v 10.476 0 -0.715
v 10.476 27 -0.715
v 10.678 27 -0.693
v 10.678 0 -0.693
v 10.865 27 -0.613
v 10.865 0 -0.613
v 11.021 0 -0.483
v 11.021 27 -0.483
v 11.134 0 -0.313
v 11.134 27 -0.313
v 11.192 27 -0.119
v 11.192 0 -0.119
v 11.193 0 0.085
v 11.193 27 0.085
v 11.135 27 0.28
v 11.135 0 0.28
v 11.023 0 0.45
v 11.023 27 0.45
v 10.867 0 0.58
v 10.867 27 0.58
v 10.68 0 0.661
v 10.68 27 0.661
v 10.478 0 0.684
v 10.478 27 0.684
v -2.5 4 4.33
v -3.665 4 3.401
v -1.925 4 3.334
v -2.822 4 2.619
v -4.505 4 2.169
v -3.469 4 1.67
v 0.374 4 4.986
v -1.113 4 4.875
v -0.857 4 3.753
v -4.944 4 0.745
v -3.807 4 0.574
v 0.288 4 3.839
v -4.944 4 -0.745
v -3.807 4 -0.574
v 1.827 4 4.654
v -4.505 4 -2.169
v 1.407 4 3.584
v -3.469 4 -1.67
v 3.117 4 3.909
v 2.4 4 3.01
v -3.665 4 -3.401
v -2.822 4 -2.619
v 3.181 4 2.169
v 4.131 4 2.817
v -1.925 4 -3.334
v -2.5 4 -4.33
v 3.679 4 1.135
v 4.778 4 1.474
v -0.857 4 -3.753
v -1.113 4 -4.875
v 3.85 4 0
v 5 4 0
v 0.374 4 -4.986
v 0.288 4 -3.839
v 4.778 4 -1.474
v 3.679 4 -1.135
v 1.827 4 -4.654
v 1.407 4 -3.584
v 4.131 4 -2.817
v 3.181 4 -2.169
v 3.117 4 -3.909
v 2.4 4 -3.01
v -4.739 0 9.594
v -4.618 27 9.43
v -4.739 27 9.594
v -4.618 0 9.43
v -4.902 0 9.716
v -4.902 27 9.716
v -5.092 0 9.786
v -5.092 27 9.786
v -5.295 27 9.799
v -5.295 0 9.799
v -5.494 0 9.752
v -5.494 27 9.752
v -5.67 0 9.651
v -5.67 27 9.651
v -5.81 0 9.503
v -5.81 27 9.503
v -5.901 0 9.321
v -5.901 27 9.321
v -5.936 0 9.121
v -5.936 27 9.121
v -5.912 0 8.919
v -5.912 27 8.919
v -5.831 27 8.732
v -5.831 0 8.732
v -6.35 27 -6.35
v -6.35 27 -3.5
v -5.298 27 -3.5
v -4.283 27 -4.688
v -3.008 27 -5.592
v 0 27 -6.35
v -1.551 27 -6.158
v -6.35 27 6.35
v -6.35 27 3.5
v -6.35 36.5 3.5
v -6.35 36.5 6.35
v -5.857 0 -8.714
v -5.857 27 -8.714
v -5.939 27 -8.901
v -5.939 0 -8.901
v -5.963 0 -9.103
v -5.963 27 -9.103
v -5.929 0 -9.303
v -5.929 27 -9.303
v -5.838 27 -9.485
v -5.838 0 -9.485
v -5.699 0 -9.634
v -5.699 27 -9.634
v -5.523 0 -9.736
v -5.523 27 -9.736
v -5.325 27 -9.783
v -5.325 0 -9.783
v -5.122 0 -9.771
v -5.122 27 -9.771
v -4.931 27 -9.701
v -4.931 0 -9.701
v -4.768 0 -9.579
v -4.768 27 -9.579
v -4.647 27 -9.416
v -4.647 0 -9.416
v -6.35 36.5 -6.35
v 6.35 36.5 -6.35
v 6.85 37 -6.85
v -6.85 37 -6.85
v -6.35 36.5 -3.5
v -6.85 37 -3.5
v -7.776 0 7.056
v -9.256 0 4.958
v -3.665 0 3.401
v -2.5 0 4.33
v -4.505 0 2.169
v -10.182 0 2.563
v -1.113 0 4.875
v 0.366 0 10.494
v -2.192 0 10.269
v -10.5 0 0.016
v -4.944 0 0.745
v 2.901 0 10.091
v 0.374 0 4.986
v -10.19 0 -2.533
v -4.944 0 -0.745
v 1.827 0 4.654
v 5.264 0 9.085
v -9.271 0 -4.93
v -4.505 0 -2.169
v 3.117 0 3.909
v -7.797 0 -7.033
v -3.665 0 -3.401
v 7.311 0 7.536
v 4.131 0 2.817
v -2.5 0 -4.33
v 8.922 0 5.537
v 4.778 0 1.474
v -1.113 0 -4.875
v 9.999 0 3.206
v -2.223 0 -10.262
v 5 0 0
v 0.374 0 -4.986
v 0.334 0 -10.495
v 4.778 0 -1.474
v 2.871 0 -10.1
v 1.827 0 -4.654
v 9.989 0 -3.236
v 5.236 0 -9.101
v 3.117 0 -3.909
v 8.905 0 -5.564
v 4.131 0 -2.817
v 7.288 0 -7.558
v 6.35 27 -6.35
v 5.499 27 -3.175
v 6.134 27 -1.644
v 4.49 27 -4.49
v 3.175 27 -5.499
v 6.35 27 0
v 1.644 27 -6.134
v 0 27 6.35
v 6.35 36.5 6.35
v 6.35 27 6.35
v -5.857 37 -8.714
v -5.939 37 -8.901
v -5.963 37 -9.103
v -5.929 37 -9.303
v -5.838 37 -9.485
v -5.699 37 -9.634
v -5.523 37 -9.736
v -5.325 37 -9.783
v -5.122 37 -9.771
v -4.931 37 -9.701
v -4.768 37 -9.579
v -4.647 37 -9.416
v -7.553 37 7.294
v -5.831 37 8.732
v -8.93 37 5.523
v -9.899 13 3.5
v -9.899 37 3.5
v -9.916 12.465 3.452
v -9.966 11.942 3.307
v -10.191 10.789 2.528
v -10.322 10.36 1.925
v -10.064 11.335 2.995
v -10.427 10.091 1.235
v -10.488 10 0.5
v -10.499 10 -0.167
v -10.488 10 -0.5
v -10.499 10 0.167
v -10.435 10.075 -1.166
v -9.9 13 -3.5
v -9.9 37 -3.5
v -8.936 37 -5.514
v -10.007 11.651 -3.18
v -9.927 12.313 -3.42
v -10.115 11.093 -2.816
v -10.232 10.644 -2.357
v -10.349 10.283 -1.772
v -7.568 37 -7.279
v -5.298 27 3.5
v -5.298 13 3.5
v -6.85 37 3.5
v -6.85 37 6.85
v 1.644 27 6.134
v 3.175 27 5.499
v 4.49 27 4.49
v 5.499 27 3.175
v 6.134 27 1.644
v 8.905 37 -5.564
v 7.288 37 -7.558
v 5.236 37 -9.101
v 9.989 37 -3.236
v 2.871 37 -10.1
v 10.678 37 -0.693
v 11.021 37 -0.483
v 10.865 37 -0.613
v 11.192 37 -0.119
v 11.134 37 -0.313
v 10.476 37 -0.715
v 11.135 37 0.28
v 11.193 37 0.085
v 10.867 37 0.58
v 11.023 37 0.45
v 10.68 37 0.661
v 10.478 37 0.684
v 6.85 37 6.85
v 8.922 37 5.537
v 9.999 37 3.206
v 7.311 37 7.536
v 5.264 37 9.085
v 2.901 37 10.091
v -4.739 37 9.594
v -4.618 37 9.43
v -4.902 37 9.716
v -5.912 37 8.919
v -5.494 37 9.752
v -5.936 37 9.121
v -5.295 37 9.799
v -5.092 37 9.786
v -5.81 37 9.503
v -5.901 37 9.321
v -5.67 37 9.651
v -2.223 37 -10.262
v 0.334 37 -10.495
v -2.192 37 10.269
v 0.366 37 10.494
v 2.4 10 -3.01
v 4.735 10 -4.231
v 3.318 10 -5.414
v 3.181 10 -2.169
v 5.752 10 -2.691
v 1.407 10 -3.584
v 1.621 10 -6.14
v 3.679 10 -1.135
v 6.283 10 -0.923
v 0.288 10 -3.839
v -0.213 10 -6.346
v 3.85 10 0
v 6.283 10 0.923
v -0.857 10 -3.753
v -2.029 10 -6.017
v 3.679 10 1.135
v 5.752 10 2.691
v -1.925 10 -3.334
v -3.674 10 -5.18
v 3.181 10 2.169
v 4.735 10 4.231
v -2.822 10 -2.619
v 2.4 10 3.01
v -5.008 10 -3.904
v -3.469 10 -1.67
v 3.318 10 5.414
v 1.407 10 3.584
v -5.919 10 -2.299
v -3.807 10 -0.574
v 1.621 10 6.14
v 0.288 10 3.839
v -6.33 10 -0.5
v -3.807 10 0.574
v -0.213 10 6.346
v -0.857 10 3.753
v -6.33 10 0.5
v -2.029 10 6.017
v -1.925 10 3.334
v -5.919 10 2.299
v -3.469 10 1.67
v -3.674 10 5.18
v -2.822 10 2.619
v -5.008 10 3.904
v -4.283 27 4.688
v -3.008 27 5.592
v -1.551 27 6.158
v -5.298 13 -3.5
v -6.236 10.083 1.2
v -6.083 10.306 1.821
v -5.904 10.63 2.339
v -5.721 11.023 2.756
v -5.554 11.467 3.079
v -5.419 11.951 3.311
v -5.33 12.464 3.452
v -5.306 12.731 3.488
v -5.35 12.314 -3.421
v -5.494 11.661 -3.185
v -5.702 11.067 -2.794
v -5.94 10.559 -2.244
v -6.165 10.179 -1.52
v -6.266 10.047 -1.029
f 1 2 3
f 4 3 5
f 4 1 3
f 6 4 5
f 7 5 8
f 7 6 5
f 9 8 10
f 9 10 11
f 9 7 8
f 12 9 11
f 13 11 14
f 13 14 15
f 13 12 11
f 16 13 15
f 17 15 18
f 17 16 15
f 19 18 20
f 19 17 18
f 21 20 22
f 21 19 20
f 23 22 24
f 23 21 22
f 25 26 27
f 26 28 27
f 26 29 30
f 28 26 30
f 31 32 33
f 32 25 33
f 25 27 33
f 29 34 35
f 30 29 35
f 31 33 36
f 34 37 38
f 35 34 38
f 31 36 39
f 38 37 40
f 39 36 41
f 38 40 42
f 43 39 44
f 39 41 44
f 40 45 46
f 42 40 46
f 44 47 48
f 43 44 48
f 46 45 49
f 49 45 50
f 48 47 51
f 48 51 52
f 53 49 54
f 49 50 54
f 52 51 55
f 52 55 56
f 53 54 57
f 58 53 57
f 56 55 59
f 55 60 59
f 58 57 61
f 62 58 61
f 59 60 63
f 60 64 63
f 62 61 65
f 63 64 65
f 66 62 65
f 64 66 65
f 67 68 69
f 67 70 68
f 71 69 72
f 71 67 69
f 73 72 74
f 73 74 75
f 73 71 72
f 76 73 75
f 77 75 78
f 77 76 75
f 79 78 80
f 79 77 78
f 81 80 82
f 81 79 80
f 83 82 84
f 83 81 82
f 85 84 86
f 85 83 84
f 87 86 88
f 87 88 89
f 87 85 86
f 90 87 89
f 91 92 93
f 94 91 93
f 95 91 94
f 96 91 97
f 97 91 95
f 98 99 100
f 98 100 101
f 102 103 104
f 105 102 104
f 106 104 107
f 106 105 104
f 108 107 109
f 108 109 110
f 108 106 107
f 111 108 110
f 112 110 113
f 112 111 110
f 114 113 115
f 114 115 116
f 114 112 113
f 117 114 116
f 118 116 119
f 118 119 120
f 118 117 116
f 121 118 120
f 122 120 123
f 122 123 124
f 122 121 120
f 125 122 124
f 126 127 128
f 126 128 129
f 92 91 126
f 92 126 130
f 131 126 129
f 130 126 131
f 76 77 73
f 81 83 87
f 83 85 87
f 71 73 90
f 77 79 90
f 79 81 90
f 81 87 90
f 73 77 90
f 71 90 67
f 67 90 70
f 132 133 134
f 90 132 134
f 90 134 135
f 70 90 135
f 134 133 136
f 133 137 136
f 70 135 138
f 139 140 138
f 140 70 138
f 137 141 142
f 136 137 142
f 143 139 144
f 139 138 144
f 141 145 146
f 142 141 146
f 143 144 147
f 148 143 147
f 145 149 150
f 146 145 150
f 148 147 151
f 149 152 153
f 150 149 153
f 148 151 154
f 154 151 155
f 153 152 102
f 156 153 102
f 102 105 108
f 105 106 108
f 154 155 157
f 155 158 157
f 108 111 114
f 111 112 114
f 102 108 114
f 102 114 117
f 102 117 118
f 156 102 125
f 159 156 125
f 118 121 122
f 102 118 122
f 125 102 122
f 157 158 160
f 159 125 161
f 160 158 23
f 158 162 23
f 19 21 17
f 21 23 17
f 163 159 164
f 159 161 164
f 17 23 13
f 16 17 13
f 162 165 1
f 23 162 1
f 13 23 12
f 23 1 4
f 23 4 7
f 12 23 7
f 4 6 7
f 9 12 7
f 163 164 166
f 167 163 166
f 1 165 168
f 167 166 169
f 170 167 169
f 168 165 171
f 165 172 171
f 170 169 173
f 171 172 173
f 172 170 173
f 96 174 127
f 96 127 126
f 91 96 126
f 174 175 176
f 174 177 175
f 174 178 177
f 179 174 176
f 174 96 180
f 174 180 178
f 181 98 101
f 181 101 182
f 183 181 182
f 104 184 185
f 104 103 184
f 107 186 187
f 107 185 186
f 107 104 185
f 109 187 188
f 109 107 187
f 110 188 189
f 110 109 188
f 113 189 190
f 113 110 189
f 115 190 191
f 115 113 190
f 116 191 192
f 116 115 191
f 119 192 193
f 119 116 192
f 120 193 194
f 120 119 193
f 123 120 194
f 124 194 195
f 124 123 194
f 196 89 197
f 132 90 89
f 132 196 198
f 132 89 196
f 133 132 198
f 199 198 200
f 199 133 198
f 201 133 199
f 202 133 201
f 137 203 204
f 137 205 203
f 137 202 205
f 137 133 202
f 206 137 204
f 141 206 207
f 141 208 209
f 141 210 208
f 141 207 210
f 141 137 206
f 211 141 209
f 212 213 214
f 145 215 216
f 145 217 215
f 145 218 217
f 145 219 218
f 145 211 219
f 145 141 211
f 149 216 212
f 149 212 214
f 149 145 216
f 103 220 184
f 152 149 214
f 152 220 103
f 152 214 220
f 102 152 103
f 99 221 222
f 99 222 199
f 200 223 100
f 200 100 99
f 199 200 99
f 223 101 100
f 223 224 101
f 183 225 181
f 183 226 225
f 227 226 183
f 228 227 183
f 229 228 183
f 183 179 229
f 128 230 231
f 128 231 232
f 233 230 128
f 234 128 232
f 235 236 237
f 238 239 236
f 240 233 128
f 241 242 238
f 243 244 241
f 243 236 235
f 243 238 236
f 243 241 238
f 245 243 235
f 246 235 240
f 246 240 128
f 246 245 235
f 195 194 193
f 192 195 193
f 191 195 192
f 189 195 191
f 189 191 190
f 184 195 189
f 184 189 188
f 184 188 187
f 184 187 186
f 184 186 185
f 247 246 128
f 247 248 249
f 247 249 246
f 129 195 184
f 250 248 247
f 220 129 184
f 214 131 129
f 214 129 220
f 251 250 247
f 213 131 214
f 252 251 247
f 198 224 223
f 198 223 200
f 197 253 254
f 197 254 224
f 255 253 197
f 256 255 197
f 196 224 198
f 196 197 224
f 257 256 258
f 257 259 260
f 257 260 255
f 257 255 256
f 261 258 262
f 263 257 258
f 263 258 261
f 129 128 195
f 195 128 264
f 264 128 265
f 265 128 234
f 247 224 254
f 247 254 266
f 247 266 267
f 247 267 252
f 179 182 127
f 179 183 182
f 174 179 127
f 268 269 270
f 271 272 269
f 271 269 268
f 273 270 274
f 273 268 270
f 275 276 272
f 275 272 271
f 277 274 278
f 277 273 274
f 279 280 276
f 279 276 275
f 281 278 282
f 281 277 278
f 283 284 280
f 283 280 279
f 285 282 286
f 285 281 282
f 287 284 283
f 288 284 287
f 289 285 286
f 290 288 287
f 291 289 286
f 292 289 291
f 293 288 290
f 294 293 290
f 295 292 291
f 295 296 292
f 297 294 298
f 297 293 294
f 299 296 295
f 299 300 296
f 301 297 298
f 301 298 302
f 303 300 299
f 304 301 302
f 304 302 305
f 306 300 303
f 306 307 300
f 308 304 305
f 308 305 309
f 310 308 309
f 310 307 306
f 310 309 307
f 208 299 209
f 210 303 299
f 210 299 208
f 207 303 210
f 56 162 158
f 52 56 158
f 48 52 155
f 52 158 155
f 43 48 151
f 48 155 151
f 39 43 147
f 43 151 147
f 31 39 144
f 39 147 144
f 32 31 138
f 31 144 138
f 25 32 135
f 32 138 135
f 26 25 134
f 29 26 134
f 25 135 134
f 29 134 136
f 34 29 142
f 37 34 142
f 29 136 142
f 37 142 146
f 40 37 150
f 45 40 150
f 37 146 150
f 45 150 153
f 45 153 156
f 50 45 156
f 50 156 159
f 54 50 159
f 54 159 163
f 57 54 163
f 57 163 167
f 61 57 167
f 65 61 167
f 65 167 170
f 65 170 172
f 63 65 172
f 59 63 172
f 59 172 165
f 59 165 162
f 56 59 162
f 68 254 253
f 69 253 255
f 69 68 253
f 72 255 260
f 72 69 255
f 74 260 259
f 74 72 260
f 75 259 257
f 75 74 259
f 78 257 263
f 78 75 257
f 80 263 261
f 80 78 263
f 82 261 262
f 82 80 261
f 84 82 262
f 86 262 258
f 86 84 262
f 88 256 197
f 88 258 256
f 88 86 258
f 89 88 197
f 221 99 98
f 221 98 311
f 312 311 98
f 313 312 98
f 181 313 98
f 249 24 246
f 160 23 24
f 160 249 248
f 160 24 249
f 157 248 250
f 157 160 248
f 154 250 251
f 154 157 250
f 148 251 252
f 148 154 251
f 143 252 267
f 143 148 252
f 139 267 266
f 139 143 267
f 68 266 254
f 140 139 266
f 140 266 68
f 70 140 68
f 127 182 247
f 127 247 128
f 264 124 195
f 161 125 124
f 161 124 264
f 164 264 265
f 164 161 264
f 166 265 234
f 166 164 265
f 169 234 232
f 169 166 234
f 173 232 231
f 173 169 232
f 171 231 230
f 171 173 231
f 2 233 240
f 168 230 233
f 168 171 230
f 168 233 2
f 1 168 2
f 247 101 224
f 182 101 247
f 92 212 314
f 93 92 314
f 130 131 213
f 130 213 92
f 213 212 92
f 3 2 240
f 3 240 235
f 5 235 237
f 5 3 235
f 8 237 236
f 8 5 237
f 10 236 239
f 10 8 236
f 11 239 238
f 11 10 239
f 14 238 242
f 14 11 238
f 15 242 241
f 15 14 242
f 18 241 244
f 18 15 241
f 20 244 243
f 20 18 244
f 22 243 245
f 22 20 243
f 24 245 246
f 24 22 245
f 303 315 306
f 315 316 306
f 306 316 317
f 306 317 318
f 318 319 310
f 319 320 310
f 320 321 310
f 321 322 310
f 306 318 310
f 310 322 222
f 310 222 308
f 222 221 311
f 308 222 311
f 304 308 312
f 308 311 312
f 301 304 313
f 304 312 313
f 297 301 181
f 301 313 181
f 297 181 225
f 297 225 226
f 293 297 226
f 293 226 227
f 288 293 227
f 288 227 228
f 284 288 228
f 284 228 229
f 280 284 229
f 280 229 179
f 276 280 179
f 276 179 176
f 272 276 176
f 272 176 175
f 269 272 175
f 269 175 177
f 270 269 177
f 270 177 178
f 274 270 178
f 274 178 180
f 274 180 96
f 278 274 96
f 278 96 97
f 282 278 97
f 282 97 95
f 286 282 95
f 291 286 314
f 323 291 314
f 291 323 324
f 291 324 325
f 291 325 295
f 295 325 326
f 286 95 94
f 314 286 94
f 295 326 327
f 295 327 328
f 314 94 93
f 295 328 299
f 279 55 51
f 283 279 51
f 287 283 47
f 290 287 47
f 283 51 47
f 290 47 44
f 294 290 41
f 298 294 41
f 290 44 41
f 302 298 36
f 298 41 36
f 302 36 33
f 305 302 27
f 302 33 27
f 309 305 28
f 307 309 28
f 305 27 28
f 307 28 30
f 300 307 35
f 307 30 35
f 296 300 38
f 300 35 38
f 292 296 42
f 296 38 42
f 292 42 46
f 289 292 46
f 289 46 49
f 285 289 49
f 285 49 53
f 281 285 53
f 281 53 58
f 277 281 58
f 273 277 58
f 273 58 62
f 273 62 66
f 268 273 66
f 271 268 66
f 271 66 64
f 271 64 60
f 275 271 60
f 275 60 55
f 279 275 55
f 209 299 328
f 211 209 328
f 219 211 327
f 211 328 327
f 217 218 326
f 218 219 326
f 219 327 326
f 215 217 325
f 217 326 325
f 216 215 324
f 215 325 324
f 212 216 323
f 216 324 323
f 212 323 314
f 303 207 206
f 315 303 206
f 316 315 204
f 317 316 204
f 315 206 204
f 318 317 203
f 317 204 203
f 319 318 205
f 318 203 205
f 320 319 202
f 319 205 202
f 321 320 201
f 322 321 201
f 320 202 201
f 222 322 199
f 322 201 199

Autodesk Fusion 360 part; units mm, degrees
sketch "Sketch1" plane through (0, 0, 0) normal (0, 1, 0) x (1, 0, 0) in component "SwitchSpacer"
  arc A0 (-5.8311, -8.732) -> (-5.8573, 8.7145) centre (0, 0) cw
  arc A1 (-4.6183, -9.4298) -> (-5.8311, -8.732) centre (-5.2363, -9.1011) cw
  line L0 (-20, 3.982) -> (0, 3.982)
  arc A2 (10.4756, 0.7154) -> (10.4777, -0.6839) centre (10.5, 0.0158) cw
  arc A3 (-4.6466, 9.4159) -> (10.4756, 0.7154) centre (0, 0) cw
  arc A4 (10.4777, -0.6839) -> (-4.6183, -9.4298) centre (0, 0) cw
  arc A5 (-5.8573, 8.7145) -> (-4.6466, 9.4159) centre (-5.2637, 9.0854) cw
  line L1 (-20, -4.0237) -> (-20, 3.982)
  circle A6 centre (0, 0) radius 8
  line L2 (0, 3.982) -> (0, -4.0237)
  line L3 (0, -4.0237) -> (-20, -4.0237)
  circle A7 centre (0, 0) radius 5
  circle A8 centre (0, 0) radius 3.85
  dimension "d8" = 10
  dimension "d9" = 7.7
extrude "Extrude8" add sketch "Sketch1" along normal blind 27 contours A0 A1 L0 A2 A3 A4 A5 A6 L3 | A0 L0 A6 L3 | L0 A6 L3 A7 | L0 A6 L3 A7 | L0 L2 L3 A7 A8 | L0 L2 L3 A7 A8 in component "SwitchSpacer"
sketch "Sketch2" plane through (0, 27, 0) normal (0, 1, 0) x (-1, 0, 0) in component "SwitchSpacer"
  circle A0 centre (0, 0) radius 4
  line L0 (6.35, 6.35) -> (-6.35, 6.35)
  line L1 (-6.35, 6.35) -> (-6.35, -6.35)
  line L2 (-6.35, -6.35) -> (6.35, -6.35)
  line L3 (6.35, -6.35) -> (6.35, 6.35)
  line L4 (6.35, 6.35) -> (-6.35, -6.35) construction
  line L5 (-6.35, 6.35) -> (6.35, -6.35) construction
  line L6 (6.35, 6.35) -> (19.35, 6.35)
  line L7 (19.35, 6.35) -> (19.35, -6.35)
  line L8 (19.35, -6.35) -> (6.35, -6.35)
  line L9 (6.35, -6.35) -> (6.35, 6.35)
  circle A1 centre (0, 0) radius 6.35
  line L10 (12.5, -3.5) -> (-12.5, -3.5)
  line L11 (-12.5, -3.5) -> (-12.5, 3.5)
  line L12 (-12.5, 3.5) -> (12.5, 3.5)
  line L13 (12.5, 3.5) -> (12.5, -3.5)
  line L14 (12.5, -3.5) -> (-12.5, 3.5) construction
  line L15 (-12.5, -3.5) -> (12.5, 3.5) construction
  arc A2 (5.8573, -8.7145) -> (5.8311, 8.732) centre (0, 0) ccw
  arc A3 (5.8311, 8.732) -> (4.6183, 9.4298) centre (5.2363, 9.1011) ccw
  arc A4 (4.6183, 9.4298) -> (-10.4777, 0.6839) centre (0, 0) ccw
  arc A5 (-10.4777, 0.6839) -> (-10.4756, -0.7154) centre (-10.5, -0.0158) ccw
  arc A6 (-10.4756, -0.7154) -> (4.6466, -9.4159) centre (0, 0) ccw
  arc A7 (4.6466, -9.4159) -> (5.8573, -8.7145) centre (5.2637, -9.0854) ccw
  circle A8 centre (0, 0) radius 3.85
  dimension "d18" = 12.7
  dimension "d19" = 12.7
  dimension "d20" = 13
  dimension "d21" = 12.7
  dimension "d22" = 12.7
  dimension "d27" = 25
  dimension "d28" = 7
extrude "Extrude9" cut sketch "Sketch1" along normal blind 4 contours L0 L2 L3 A7 A8 | L0 L2 L3 A7 A8 in component "SwitchSpacer"
extrude "Extrude10" add sketch "Sketch2" along normal blind 10 contours L0 L1 L6 L12 A2 A3 A4 | L3 L6 L9 L12 A2 | L1 L2 L8 L10 A2 A6 A7 | L3 L8 L9 L10 A2 | L1 L10 L12 A4 A5 A6 in component "SwitchSpacer"
extrude "Extrude11" cut sketch "Sketch2" against normal blind 17 contours A0 L10 L12 A8 | A0 A1 L10 L12 | A0 L12 A8 | A0 A1 L12 | A0 A1 L10 | A0 L10 A8 | A0 L10 L12 A8 | A0 A1 L10 L12 | L3 L9 A1 L12 | L3 L9 A1 L10 | L3 L9 L10 L12 A2 in component "SwitchSpacer"
fillet "Fillet1" radius 3 2 edges at (-7.5989, 10, -3.5) (-7.5989, 10, 3.5) in component "SwitchSpacer"
chamfer "Chamfer1" distance 0.5 angle 45 5 edges at (-6.35, 37, -4.925) (0, 37, -6.35) (-6.35, 37, 4.925) (0, 37, 6.35) (6.35, 37, 0) in component "SwitchSpacer"
component "SwitchSpacer" placed x (1, 0, 0) y (0, 1, 0) z (0, 0, 1) at (0, 0, 0)
